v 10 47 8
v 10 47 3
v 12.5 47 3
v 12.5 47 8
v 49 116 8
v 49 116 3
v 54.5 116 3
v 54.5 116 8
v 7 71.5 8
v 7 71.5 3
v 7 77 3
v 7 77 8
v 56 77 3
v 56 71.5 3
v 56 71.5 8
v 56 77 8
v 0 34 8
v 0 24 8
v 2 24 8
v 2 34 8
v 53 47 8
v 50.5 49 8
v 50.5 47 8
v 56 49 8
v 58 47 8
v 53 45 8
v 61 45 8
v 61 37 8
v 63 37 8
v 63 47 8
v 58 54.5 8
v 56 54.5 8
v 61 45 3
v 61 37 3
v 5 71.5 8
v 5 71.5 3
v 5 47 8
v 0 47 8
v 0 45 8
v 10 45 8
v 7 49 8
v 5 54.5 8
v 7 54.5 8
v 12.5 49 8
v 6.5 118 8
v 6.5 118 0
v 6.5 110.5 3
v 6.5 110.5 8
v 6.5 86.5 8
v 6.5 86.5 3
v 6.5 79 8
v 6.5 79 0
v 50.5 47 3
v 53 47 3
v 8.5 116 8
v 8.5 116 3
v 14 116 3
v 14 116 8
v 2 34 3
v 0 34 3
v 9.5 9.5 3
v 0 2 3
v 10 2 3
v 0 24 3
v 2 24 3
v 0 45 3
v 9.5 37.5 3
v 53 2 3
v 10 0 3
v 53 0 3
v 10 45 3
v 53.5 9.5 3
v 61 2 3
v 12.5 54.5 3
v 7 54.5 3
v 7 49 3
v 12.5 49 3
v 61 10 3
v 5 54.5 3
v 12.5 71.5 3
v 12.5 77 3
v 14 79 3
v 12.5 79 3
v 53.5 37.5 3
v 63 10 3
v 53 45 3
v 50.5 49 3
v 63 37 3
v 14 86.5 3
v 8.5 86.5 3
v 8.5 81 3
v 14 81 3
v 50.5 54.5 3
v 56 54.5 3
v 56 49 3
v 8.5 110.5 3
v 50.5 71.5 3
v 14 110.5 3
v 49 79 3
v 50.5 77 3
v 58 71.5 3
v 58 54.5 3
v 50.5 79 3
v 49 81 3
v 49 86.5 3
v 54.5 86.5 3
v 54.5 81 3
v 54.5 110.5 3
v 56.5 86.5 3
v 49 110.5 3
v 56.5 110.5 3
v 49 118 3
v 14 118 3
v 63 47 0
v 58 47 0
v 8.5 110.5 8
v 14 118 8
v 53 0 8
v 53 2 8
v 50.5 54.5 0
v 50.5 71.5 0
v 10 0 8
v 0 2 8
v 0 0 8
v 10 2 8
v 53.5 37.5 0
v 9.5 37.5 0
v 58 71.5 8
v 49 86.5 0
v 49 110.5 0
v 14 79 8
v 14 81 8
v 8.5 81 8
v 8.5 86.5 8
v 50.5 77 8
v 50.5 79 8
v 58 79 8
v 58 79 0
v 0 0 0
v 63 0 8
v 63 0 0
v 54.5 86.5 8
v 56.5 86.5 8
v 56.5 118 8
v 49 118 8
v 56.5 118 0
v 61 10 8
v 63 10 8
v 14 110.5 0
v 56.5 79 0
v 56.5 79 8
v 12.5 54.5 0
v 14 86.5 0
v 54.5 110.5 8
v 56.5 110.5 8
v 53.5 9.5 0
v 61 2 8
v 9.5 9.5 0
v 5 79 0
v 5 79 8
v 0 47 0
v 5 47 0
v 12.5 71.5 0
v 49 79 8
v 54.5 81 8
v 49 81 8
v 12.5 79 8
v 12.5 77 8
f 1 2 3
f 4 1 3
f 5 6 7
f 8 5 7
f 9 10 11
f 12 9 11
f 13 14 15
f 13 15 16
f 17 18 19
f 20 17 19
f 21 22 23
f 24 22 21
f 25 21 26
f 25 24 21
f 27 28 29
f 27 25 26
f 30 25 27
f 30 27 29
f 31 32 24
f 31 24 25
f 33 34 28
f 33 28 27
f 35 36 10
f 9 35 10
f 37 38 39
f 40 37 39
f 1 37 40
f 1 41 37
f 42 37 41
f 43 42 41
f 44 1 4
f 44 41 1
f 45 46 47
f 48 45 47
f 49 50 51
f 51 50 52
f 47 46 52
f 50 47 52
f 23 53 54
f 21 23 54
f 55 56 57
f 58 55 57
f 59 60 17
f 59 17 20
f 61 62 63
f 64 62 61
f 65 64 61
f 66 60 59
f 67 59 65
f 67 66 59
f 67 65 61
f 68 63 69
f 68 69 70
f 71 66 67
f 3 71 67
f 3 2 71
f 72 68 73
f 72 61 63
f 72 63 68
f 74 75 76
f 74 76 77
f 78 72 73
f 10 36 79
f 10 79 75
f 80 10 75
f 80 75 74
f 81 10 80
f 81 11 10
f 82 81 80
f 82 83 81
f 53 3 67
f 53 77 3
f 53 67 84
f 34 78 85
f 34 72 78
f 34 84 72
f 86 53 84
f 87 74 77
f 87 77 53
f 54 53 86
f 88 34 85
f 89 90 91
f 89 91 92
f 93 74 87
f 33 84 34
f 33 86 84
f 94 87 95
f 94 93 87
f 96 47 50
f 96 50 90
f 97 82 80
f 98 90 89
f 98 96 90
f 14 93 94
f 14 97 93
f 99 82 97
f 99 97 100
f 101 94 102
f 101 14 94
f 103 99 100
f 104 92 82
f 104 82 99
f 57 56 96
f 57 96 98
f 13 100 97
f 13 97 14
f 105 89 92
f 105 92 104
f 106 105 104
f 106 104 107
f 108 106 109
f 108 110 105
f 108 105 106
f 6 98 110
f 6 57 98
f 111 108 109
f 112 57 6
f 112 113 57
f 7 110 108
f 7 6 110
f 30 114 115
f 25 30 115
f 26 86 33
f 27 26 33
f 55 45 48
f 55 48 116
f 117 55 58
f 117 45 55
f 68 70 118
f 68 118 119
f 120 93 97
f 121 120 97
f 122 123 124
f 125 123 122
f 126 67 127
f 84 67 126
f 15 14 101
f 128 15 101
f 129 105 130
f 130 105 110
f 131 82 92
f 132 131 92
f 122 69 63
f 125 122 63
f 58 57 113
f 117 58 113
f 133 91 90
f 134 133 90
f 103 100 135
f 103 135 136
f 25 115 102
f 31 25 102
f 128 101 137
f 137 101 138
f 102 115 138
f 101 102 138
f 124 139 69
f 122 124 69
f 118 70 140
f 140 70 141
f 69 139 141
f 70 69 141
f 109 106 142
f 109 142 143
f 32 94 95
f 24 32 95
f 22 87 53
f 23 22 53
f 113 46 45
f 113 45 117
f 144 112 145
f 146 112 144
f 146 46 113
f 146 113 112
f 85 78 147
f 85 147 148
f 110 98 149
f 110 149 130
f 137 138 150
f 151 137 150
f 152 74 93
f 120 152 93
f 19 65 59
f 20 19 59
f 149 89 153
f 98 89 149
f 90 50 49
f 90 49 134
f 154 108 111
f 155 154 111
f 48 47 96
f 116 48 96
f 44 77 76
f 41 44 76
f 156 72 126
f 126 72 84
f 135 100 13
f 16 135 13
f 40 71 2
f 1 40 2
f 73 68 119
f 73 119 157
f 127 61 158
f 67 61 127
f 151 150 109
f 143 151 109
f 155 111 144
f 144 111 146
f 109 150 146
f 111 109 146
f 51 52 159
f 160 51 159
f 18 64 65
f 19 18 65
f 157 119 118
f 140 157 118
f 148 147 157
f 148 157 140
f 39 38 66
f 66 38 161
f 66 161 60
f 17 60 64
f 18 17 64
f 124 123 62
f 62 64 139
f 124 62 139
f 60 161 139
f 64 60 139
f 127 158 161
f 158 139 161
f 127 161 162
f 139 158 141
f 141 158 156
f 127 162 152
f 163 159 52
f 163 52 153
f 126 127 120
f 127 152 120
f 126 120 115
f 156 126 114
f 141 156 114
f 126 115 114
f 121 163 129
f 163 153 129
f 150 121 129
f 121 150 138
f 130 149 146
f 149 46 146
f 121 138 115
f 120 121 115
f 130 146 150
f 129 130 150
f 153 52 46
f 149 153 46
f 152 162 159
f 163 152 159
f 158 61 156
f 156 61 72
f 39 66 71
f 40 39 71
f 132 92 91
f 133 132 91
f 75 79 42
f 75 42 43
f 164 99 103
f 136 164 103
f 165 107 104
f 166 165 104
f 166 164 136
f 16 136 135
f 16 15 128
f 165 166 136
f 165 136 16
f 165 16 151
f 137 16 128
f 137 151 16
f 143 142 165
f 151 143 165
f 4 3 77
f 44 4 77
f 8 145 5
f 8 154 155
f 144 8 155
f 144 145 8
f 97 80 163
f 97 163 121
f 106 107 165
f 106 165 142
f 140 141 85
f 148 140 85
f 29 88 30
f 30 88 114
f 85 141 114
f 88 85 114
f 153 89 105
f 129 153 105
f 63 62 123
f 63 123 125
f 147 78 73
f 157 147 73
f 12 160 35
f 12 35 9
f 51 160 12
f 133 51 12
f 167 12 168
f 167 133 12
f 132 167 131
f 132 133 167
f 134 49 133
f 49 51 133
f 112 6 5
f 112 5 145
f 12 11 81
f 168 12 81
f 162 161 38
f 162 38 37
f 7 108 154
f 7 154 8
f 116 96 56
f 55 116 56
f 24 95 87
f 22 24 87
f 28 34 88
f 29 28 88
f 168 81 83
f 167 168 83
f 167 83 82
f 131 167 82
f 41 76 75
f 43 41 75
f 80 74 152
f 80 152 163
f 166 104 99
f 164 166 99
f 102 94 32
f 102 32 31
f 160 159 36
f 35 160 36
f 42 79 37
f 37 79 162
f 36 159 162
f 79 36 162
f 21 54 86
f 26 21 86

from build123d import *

# Parameters (mm, degrees)
SKETCH1_W           = 50
SKETCH1_H           = 39
BOSS_EXTRUDE1_DEPTH = 3
SKETCH2_W           = 2
SKETCH2_H           = 2
SKETCH2_H_2         = 8
SKETCH2_W_2         = 8
SKETCH2_W_3         = 10
SKETCH2_H_3         = 10
BOSS_EXTRUDE2_DEPTH = 5
SKETCH3_W           = 44
SKETCH3_H           = 28
CUT_EXTRUDE1_DEPTH  = 5
SKETCH4_W           = 2
SKETCH4_H           = 2
SKETCH4_H_2         = 5.5
SKETCH4_W_2         = 5.5
BOSS_EXTRUDE3_DEPTH = 5
SKETCH5_W           = 2
SKETCH5_H           = 5.5
SKETCH5_H_2         = 2
SKETCH5_W_2         = 5.5
BOSS_EXTRUDE4_DEPTH = 5
SKETCH6_W           = 38
SKETCH6_H           = 17
CUT_EXTRUDE2_DEPTH  = 5
SKETCH7_W           = 35
SKETCH7_H           = 24
CUT_EXTRUDE3_DEPTH  = 5


with BuildPart() as part:
    # Sketch1 → Boss-Extrude1 (new body)
    with BuildSketch(Plane.XY):
        Polygon((5, 47), (0, 47), (0, 0), (63, 0), (63, 47), (58, 47), align=None)
        Polygon((5, 79), (5, 47), (58, 47), (58, 79), (56.5, 79), (6.5, 79), align=None)
        with Locations((31.5, 98.5)):
            Rectangle(SKETCH1_W, SKETCH1_H)
    extrude(amount=BOSS_EXTRUDE1_DEPTH)

    # Sketch2 → Boss-Extrude2 (add)
    with BuildSketch(Plane.XY.offset(3)):
        Polygon((53, 45), (61, 45), (61, 47), (58, 47), (53, 47), align=None)
        with Locations((62, 46)):
            Rectangle(SKETCH2_W, SKETCH2_H)
        with Locations((62, 41)):
            Rectangle(SKETCH2_W, SKETCH2_H_2)
        with Locations((62, 6)):
            Rectangle(SKETCH2_W, SKETCH2_H_2)
        with Locations((62, 1)):
            Rectangle(SKETCH2_W, SKETCH2_H)
        with Locations((57, 1)):
            Rectangle(SKETCH2_W_2, SKETCH2_H)
        with Locations((5, 1)):
            Rectangle(SKETCH2_W_3, SKETCH2_H)
        with Locations((5, 46)):
            Rectangle(SKETCH2_W_3, SKETCH2_H)
        with Locations((1, 29)):
            Rectangle(SKETCH2_W, SKETCH2_H_3)
    extrude(amount=BOSS_EXTRUDE2_DEPTH)

    # Sketch3 → Cut-Extrude1 (cut)
    with BuildSketch(Plane.XY.offset(3)):
        with Locations((31.5, 23.5)):
            Rectangle(SKETCH3_W, SKETCH3_H)
    extrude(amount=-CUT_EXTRUDE1_DEPTH, mode=Mode.SUBTRACT)

    # Sketch4 → Boss-Extrude3 (add)
    with BuildSketch(Plane.XY.offset(3)):
        with Locations((6, 48)):
            Rectangle(SKETCH4_W, SKETCH4_H)
        with Locations((6, 51.75)):
            Rectangle(SKETCH4_W, SKETCH4_H_2)
        Polygon((7, 49), (7, 47), (10, 47), (12.5, 47), (12.5, 49), align=None)
        with Locations((6, 74.25)):
            Rectangle(SKETCH4_W, SKETCH4_H_2)
        Polygon((5, 79), (5, 77), (7, 77), (7, 79), (6.5, 79), align=None)
        with Locations((9.75, 78)):
            Rectangle(SKETCH4_W_2, SKETCH4_H)
        with Locations((53.25, 78)):
            Rectangle(SKETCH4_W_2, SKETCH4_H)
        Polygon((56, 77), (58, 77), (58, 79), (56.5, 79), (56, 79), align=None)
        with Locations((57, 74.25)):
            Rectangle(SKETCH4_W, SKETCH4_H_2)
        with Locations((57, 51.75)):
            Rectangle(SKETCH4_W, SKETCH4_H_2)
        with Locations((57, 48)):
            Rectangle(SKETCH4_W, SKETCH4_H)
        Polygon((53, 47), (56, 47), (56, 49), (50.5, 49), (50.5, 47), align=None)
    extrude(amount=BOSS_EXTRUDE3_DEPTH)

    # Sketch5 → Boss-Extrude4 (add)
    with BuildSketch(Plane.XY.offset(3)):
        with Locations((7.5, 83.75)):
            Rectangle(SKETCH5_W, SKETCH5_H)
        Polygon((8.5, 81), (8.5, 79), (12.5, 79), (14, 79), (14, 81), align=None)
        with Locations((7.5, 80)):
            Rectangle(SKETCH5_W, SKETCH5_H_2)
        Polygon((54.5, 79), (54.5, 81), (49, 81), (49, 79), (50.5, 79), align=None)
        with Locations((55.5, 80)):
            Rectangle(SKETCH5_W, SKETCH5_H_2)
        with Locations((55.5, 83.75)):
            Rectangle(SKETCH5_W, SKETCH5_H)
        with Locations((51.75, 117)):
            Rectangle(SKETCH5_W_2, SKETCH5_H_2)
        with Locations((55.5, 117)):
            Rectangle(SKETCH5_W, SKETCH5_H_2)
        with Locations((55.5, 113.25)):
            Rectangle(SKETCH5_W, SKETCH5_H)
        with Locations((11.25, 117)):
            Rectangle(SKETCH5_W_2, SKETCH5_H_2)
        with Locations((7.5, 117)):
            Rectangle(SKETCH5_W, SKETCH5_H_2)
        with Locations((7.5, 113.25)):
            Rectangle(SKETCH5_W, SKETCH5_H)
    extrude(amount=BOSS_EXTRUDE4_DEPTH)

    # Sketch6 → Cut-Extrude2 (cut)
    with BuildSketch(Plane.XY.offset(3)):
        with Locations((31.5, 63)):
            Rectangle(SKETCH6_W, SKETCH6_H)
    extrude(amount=-CUT_EXTRUDE2_DEPTH, mode=Mode.SUBTRACT)

    # Sketch7 → Cut-Extrude3 (cut)
    with BuildSketch(Plane.XY.offset(3)):
        with Locations((31.5, 98.5)):
            Rectangle(SKETCH7_W, SKETCH7_H)
    extrude(amount=-CUT_EXTRUDE3_DEPTH, mode=Mode.SUBTRACT)


solid = part.part
